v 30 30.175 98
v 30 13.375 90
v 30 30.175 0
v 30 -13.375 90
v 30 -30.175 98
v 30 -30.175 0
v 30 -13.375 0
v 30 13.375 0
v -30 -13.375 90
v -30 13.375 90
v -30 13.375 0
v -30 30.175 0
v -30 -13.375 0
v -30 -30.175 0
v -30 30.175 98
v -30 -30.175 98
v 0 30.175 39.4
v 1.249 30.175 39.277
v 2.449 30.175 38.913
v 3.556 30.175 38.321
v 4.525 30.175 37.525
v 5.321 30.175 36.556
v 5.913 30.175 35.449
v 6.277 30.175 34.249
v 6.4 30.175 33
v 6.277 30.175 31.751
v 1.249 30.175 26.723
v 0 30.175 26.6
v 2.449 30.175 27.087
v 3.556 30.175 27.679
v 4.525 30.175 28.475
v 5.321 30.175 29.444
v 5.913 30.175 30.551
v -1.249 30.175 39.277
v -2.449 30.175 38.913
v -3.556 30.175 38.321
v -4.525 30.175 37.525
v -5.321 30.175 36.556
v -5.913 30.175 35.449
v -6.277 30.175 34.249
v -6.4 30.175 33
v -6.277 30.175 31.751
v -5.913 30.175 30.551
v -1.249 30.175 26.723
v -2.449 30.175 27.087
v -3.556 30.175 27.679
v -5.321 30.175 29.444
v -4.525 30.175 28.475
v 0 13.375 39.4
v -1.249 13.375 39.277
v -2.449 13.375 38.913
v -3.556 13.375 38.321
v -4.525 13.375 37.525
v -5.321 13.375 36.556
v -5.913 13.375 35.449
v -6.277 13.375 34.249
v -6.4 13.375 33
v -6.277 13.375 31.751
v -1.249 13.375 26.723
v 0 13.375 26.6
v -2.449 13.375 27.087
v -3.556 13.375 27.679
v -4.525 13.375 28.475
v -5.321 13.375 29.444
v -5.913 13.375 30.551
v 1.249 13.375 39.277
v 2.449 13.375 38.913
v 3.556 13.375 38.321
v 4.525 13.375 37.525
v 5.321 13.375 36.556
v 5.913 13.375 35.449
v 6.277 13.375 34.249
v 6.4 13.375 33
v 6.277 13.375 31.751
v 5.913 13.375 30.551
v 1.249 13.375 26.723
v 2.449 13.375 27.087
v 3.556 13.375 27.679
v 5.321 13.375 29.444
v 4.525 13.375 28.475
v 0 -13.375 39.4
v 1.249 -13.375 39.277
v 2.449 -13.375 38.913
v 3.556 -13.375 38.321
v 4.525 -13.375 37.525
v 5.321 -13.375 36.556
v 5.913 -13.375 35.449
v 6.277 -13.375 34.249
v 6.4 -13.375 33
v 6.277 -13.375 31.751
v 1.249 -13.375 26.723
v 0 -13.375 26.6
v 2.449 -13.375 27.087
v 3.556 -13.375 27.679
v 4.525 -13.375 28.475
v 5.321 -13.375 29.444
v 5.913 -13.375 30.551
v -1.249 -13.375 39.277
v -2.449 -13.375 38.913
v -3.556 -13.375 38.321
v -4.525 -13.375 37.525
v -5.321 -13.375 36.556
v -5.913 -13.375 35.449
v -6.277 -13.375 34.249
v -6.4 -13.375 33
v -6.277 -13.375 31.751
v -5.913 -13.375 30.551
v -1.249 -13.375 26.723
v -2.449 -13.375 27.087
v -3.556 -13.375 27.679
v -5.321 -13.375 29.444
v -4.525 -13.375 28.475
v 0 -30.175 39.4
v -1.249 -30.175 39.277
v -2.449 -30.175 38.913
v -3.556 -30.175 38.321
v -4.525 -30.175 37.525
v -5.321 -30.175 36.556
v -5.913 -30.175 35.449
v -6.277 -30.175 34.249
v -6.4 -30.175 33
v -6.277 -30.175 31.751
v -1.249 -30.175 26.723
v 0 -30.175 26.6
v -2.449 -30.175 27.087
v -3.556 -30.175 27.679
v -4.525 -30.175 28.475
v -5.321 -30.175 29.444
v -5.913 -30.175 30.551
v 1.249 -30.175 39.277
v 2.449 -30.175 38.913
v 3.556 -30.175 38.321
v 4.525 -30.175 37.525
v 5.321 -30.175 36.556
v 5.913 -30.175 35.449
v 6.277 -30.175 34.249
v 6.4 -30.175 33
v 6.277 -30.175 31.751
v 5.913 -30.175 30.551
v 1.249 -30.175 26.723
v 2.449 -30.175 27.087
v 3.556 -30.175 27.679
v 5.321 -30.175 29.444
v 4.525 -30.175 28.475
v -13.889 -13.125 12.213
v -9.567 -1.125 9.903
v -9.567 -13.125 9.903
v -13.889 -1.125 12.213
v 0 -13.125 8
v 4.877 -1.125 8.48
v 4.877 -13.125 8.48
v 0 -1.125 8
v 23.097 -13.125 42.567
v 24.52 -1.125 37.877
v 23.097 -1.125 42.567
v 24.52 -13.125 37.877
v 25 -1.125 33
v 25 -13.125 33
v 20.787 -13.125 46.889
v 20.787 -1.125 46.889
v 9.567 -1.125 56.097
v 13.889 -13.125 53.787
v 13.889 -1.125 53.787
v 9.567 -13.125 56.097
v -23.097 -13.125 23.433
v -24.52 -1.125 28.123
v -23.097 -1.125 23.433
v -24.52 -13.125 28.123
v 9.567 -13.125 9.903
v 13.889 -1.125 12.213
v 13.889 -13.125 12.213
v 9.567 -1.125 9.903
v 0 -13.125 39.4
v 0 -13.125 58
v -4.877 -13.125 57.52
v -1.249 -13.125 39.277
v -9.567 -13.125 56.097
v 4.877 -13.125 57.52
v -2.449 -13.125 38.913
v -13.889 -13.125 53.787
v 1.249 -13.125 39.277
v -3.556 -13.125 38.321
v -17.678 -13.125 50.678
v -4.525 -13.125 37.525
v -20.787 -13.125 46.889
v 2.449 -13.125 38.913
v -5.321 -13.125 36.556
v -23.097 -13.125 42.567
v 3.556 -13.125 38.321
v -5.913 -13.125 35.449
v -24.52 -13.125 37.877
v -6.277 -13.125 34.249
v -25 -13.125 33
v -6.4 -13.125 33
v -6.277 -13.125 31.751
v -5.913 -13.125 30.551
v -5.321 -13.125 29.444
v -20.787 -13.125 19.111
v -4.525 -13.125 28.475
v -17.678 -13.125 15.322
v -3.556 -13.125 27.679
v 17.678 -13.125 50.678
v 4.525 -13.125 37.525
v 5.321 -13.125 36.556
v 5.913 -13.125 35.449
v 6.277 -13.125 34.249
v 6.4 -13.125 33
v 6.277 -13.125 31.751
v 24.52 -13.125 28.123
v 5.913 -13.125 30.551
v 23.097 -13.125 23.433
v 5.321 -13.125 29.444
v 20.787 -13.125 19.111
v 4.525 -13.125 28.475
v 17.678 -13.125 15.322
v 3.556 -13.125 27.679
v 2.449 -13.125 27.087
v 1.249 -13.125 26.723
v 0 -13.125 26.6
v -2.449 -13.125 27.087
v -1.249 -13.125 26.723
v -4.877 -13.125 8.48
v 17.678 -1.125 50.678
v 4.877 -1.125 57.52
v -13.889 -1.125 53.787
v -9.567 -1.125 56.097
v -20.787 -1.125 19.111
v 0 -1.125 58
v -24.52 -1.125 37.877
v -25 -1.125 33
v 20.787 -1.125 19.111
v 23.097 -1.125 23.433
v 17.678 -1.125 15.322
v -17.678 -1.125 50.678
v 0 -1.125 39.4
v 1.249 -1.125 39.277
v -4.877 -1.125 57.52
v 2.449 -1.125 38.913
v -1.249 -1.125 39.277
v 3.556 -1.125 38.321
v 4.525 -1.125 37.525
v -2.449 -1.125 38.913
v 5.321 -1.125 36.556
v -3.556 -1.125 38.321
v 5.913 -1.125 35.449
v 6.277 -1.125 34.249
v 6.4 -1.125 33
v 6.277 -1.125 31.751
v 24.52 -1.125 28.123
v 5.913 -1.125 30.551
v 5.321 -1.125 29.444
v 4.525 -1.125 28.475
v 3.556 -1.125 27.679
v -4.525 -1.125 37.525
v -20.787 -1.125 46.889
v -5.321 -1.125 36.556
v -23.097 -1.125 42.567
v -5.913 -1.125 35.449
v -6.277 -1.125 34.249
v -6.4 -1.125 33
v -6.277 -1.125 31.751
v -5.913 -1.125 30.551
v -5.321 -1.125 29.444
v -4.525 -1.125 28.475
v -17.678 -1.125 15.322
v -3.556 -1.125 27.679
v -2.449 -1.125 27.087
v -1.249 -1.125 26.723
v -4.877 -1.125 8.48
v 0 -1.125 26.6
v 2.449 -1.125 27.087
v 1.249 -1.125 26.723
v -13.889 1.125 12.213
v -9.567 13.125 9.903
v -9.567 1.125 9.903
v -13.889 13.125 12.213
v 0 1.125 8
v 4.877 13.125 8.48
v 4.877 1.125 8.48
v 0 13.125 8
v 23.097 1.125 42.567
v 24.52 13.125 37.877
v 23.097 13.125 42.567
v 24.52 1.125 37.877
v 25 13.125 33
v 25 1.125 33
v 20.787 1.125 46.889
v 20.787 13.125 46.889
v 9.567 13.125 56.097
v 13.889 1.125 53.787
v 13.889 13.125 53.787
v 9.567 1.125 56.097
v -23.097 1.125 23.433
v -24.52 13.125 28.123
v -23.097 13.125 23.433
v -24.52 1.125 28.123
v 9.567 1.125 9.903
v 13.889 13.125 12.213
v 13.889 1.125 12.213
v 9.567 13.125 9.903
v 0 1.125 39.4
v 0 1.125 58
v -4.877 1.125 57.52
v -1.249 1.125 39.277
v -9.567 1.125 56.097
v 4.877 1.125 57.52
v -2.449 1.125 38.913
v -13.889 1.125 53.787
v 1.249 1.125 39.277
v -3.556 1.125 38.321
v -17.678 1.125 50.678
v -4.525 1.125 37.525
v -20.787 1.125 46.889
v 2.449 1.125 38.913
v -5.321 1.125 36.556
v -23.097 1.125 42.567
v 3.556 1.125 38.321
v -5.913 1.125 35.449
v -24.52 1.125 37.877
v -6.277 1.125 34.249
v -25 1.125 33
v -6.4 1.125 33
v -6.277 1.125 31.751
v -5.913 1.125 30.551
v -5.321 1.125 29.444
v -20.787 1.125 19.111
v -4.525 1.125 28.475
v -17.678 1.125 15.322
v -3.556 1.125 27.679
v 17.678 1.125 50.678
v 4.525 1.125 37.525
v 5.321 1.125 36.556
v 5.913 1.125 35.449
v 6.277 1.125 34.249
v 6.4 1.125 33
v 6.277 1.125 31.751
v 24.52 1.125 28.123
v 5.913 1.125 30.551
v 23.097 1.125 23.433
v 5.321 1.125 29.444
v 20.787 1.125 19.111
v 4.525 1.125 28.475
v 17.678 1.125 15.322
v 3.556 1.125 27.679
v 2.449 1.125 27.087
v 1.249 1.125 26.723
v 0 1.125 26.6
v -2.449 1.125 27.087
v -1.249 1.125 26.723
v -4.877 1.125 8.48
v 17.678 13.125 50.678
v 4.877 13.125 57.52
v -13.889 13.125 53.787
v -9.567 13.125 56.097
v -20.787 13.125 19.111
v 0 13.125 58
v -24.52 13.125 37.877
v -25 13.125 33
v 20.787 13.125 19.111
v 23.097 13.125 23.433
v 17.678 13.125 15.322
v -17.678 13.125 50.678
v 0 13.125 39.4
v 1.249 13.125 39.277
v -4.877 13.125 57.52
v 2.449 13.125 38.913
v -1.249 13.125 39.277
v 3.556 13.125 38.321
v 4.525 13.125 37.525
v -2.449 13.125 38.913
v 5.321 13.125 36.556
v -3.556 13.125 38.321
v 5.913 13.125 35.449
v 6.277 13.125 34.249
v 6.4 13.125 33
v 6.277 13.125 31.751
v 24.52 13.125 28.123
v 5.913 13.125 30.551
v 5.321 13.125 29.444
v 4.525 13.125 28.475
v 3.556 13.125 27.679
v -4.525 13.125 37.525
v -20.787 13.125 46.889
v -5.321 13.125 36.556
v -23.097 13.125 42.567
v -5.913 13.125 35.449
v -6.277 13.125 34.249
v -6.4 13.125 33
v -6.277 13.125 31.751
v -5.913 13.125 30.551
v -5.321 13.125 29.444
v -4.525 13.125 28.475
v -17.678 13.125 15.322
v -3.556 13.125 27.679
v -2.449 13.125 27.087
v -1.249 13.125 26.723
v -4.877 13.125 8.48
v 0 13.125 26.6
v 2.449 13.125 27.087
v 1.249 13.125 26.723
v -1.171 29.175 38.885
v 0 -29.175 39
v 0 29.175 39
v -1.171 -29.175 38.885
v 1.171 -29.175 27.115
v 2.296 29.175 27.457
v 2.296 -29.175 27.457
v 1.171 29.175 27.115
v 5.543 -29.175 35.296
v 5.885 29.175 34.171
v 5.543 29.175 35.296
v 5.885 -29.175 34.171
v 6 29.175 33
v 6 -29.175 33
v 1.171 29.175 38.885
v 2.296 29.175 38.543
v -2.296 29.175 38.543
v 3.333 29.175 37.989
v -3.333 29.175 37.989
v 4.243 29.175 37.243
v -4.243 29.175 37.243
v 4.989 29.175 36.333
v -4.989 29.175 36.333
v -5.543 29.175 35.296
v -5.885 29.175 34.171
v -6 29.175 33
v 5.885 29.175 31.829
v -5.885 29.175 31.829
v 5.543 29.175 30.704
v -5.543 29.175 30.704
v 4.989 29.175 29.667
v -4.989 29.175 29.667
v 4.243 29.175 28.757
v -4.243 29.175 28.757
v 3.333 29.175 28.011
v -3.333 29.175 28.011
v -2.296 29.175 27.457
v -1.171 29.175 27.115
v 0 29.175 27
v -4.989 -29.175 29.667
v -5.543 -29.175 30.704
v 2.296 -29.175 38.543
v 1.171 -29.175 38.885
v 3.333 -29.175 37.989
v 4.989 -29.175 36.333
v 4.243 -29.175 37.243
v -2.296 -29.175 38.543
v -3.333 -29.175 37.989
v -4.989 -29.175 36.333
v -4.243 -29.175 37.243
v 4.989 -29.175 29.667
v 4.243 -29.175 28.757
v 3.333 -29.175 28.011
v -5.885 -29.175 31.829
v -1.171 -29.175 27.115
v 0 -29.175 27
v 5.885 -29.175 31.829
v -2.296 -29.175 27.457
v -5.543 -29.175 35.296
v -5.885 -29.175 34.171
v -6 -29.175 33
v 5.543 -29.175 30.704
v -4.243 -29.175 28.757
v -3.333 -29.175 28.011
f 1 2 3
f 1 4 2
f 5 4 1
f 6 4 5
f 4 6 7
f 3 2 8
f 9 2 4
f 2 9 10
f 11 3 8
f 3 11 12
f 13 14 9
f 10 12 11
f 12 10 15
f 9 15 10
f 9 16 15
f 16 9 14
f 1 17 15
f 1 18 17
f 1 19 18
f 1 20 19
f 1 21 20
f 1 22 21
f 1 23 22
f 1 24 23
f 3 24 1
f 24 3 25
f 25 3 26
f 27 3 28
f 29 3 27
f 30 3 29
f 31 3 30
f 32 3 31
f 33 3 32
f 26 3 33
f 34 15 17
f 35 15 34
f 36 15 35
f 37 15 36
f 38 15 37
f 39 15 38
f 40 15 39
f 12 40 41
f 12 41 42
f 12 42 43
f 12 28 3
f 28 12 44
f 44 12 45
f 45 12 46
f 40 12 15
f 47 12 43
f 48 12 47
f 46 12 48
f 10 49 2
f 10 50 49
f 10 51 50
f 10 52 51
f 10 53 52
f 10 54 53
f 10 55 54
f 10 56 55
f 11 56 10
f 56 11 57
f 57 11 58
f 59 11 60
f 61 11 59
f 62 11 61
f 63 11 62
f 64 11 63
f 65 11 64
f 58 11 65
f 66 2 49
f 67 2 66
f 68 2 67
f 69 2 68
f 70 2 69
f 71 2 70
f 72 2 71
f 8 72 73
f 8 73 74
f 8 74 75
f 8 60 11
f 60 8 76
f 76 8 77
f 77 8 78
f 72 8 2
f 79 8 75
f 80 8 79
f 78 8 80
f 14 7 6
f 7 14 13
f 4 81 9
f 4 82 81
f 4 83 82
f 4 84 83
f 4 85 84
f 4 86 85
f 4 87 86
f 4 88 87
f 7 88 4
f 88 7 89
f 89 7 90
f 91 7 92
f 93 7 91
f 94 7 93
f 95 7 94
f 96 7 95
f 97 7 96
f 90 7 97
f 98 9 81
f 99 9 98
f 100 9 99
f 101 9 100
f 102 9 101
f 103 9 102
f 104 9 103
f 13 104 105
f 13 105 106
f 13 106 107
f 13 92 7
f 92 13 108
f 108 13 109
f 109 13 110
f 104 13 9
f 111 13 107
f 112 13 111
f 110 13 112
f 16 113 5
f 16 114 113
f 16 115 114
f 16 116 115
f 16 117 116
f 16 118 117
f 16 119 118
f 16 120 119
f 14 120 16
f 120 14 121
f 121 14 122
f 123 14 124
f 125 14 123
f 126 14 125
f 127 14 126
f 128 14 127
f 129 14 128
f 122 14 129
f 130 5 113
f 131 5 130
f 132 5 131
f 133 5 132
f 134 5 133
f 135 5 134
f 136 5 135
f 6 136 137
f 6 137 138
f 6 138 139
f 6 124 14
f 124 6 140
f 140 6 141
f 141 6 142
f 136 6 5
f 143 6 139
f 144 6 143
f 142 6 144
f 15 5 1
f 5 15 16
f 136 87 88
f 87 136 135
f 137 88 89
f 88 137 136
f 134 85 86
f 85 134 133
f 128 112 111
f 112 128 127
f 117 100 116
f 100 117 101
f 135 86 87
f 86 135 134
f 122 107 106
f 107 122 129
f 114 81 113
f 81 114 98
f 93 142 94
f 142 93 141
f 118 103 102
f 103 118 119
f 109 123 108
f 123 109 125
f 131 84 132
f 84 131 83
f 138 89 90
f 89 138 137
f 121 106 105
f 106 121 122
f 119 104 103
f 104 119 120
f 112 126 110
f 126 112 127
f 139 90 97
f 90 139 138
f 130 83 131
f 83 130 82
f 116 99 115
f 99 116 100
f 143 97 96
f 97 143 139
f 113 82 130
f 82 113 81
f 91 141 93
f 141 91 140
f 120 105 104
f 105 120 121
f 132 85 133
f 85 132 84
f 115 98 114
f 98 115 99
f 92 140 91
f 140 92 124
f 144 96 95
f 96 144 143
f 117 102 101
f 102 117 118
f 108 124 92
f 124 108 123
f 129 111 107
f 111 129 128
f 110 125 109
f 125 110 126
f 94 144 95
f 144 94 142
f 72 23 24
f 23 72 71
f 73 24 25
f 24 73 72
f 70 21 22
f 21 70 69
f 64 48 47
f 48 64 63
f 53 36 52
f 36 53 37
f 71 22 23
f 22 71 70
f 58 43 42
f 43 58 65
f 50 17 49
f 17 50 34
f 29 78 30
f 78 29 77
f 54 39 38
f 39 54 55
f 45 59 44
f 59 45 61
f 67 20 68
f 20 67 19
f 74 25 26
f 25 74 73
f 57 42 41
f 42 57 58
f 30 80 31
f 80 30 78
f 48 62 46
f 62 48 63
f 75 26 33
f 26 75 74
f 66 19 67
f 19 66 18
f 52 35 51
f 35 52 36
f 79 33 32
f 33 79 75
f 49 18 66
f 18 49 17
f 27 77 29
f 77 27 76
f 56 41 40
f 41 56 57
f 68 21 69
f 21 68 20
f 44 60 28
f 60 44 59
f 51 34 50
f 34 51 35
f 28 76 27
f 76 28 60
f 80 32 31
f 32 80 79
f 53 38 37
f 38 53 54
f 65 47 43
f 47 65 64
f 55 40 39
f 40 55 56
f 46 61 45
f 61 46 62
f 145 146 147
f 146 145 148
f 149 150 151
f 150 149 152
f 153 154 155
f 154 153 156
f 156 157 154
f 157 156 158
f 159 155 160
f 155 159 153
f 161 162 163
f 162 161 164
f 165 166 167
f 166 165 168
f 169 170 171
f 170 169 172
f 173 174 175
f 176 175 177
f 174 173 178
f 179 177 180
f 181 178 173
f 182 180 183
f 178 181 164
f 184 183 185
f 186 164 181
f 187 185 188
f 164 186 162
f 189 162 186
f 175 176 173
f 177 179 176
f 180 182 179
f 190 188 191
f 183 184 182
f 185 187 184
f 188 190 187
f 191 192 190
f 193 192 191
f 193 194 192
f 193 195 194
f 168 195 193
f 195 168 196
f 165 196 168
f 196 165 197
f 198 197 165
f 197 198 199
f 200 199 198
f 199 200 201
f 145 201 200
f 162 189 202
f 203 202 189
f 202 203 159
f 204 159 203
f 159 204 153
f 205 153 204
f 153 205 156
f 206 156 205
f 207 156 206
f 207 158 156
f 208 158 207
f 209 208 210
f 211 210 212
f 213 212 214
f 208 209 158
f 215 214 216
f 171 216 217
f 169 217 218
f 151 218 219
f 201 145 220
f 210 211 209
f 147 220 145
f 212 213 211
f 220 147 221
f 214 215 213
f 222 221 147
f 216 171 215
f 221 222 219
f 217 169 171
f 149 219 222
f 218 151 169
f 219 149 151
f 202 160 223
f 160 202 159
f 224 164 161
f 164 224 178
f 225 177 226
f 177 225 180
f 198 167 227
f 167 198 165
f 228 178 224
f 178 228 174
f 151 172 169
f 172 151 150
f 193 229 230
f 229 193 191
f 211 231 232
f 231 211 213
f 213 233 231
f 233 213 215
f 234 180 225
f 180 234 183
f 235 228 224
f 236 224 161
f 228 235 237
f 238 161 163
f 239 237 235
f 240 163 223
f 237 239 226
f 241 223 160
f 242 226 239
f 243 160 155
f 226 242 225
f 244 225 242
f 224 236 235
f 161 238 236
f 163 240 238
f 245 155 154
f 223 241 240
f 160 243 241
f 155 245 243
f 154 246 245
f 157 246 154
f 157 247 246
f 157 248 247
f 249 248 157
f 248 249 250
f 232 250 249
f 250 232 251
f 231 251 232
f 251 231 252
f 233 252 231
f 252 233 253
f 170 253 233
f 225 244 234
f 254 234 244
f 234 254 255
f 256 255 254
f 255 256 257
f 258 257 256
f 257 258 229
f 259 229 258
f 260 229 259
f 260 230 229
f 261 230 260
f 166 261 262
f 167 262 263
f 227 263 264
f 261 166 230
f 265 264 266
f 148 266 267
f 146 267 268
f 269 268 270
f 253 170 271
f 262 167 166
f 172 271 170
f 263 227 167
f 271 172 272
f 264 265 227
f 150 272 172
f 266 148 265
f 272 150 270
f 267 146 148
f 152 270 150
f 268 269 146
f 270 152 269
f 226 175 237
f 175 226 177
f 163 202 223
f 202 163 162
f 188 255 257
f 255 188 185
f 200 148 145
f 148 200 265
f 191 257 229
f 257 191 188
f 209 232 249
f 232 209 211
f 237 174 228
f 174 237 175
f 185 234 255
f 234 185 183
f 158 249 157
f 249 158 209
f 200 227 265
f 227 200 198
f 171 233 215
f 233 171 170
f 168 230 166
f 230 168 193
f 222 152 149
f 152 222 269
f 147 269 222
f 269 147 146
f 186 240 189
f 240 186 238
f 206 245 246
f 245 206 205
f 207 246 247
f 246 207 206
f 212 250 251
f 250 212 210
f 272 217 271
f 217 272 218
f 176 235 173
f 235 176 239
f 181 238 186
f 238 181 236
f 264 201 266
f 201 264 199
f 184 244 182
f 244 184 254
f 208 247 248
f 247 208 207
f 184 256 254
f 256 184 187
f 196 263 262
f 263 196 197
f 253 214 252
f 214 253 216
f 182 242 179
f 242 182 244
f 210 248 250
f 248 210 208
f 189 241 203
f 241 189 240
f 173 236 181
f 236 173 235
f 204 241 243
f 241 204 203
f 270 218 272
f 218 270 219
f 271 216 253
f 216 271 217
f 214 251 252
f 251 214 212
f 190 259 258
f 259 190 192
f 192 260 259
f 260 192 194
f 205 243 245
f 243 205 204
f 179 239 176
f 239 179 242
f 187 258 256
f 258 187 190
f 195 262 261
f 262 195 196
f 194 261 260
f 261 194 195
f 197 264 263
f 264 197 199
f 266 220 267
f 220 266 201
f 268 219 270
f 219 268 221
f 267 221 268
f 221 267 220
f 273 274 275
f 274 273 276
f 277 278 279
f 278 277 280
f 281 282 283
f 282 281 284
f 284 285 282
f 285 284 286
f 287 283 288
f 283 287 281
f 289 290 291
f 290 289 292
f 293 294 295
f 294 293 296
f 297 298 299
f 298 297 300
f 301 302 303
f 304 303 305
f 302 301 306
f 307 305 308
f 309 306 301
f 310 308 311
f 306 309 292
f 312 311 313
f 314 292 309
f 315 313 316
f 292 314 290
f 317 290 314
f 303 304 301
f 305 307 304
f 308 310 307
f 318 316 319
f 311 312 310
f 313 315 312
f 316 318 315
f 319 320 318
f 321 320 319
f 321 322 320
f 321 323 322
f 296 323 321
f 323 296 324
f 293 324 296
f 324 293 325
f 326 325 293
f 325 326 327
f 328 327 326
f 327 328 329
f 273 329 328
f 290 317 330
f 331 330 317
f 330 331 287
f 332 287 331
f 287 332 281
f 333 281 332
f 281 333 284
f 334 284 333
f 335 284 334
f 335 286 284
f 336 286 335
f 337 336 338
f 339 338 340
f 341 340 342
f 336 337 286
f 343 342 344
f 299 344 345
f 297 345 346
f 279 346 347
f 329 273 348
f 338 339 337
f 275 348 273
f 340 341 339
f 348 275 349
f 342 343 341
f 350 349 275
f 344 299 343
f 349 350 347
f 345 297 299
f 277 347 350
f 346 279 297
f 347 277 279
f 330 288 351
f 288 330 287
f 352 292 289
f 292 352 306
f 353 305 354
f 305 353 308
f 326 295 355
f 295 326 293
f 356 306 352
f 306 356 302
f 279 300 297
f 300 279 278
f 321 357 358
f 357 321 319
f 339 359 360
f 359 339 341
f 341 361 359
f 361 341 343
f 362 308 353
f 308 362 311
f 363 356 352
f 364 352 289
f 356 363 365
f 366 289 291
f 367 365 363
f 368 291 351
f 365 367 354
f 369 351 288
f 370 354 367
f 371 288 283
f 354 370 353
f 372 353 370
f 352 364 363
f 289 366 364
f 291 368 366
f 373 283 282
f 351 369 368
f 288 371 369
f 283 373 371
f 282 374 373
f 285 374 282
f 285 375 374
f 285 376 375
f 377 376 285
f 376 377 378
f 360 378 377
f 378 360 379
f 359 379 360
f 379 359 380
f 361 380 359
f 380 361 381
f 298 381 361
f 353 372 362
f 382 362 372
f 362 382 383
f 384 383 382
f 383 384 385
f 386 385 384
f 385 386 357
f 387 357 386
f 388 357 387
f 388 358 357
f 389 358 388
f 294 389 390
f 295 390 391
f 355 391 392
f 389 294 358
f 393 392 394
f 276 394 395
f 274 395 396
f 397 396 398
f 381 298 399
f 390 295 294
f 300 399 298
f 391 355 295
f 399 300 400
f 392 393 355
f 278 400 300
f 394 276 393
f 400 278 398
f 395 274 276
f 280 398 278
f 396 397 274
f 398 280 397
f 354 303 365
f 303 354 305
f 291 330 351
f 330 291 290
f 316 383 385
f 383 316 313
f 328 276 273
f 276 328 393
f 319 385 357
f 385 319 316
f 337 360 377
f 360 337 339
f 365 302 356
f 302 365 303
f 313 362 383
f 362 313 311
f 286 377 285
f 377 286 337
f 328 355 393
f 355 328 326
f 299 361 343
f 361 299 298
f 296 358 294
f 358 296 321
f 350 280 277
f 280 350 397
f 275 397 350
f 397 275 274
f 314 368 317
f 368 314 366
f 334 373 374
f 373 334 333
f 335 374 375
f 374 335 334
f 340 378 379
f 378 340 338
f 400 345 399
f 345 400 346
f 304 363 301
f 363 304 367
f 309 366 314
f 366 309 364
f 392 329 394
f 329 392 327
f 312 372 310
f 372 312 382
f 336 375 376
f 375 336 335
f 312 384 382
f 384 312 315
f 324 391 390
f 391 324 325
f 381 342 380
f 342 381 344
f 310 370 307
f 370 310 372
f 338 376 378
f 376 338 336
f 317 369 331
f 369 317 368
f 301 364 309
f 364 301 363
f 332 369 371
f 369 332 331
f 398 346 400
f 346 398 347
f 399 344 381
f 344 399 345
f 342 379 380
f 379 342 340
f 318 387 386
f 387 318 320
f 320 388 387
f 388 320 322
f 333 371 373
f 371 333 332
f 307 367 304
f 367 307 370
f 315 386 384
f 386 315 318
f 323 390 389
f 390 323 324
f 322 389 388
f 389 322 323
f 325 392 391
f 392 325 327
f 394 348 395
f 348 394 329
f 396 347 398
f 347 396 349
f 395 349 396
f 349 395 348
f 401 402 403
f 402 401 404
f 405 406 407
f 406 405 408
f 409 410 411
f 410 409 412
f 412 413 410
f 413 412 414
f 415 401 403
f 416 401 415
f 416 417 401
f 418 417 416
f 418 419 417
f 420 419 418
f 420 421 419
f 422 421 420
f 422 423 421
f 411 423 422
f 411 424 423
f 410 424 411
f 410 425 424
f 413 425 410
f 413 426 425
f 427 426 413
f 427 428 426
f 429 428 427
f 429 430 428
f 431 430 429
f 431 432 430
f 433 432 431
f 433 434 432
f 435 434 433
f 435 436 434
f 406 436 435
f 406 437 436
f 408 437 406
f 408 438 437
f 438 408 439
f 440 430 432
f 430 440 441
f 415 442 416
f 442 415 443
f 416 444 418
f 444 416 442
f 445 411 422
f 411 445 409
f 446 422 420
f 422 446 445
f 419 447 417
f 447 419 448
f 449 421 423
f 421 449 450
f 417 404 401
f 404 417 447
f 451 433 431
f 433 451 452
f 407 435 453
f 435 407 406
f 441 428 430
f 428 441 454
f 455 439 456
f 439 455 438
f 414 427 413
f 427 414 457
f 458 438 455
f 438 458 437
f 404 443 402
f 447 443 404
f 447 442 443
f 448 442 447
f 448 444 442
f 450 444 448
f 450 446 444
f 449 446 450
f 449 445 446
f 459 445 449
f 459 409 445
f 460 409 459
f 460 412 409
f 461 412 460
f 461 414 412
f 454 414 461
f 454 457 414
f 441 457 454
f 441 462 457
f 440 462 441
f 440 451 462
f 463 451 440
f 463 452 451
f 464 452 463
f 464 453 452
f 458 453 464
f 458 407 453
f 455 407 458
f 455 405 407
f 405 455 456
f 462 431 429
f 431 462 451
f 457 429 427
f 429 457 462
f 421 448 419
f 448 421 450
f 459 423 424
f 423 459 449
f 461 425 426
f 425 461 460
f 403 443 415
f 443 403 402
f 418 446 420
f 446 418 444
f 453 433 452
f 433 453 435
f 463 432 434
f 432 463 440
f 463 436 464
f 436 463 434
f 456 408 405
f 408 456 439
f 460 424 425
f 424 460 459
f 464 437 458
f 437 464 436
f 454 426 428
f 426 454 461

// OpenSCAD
$fn = 32;

// ------------------------------------------------------------------------
// Trolley wheel set: wheels d50, fork 90 mm tall
// Every part is its own module, assembly() places every instance.
// ------------------------------------------------------------------------

// --- part 1 ---
module trolley_fork() {
  difference() {
    union() {
      translate([-30, 13.375, 0]) cube([60, 16.8, 90]);
      translate([-30, -30.175, 0]) cube([60, 16.8, 90]);
      translate([-30, -30.175, 90]) cube([60, 60.35, 8]);
    }
    translate([0, -21.775, 33]) rotate([90, 0, 0]) cylinder(h = 18.8, d = 12.8, center = true);
    translate([0, 21.775, 33]) rotate([90, 0, 0]) cylinder(h = 18.8, d = 12.8, center = true);
  }
}

// --- part 2 ---
module trolley_wheel() {
  difference() {
      translate([0, 0, 0]) cylinder(h = 12, d = 50);
      translate([0, 0, -1]) cylinder(h = 14, d = 12.8);
    }
}

// --- part 3 ---
module trolley_axle() {
  translate([0, 0, -29.175]) cylinder(h = 58.35, d = 12);
}

// --- assembly ---
module assembly() {
  color([0.80, 0.24, 0.20]) translate([0, 0, 0]) rotate([0, 0, 0]) trolley_fork();
  color([0.20, 0.45, 0.75]) translate([0, -1.125, 33]) rotate([90, 0, 0]) trolley_wheel();
  color([0.25, 0.62, 0.32]) translate([0, 13.125, 33]) rotate([90, 0, 0]) trolley_wheel();
  color([0.92, 0.70, 0.18]) translate([0, 0, 33]) rotate([90, 0, 0]) trolley_axle();
}

assembly();
